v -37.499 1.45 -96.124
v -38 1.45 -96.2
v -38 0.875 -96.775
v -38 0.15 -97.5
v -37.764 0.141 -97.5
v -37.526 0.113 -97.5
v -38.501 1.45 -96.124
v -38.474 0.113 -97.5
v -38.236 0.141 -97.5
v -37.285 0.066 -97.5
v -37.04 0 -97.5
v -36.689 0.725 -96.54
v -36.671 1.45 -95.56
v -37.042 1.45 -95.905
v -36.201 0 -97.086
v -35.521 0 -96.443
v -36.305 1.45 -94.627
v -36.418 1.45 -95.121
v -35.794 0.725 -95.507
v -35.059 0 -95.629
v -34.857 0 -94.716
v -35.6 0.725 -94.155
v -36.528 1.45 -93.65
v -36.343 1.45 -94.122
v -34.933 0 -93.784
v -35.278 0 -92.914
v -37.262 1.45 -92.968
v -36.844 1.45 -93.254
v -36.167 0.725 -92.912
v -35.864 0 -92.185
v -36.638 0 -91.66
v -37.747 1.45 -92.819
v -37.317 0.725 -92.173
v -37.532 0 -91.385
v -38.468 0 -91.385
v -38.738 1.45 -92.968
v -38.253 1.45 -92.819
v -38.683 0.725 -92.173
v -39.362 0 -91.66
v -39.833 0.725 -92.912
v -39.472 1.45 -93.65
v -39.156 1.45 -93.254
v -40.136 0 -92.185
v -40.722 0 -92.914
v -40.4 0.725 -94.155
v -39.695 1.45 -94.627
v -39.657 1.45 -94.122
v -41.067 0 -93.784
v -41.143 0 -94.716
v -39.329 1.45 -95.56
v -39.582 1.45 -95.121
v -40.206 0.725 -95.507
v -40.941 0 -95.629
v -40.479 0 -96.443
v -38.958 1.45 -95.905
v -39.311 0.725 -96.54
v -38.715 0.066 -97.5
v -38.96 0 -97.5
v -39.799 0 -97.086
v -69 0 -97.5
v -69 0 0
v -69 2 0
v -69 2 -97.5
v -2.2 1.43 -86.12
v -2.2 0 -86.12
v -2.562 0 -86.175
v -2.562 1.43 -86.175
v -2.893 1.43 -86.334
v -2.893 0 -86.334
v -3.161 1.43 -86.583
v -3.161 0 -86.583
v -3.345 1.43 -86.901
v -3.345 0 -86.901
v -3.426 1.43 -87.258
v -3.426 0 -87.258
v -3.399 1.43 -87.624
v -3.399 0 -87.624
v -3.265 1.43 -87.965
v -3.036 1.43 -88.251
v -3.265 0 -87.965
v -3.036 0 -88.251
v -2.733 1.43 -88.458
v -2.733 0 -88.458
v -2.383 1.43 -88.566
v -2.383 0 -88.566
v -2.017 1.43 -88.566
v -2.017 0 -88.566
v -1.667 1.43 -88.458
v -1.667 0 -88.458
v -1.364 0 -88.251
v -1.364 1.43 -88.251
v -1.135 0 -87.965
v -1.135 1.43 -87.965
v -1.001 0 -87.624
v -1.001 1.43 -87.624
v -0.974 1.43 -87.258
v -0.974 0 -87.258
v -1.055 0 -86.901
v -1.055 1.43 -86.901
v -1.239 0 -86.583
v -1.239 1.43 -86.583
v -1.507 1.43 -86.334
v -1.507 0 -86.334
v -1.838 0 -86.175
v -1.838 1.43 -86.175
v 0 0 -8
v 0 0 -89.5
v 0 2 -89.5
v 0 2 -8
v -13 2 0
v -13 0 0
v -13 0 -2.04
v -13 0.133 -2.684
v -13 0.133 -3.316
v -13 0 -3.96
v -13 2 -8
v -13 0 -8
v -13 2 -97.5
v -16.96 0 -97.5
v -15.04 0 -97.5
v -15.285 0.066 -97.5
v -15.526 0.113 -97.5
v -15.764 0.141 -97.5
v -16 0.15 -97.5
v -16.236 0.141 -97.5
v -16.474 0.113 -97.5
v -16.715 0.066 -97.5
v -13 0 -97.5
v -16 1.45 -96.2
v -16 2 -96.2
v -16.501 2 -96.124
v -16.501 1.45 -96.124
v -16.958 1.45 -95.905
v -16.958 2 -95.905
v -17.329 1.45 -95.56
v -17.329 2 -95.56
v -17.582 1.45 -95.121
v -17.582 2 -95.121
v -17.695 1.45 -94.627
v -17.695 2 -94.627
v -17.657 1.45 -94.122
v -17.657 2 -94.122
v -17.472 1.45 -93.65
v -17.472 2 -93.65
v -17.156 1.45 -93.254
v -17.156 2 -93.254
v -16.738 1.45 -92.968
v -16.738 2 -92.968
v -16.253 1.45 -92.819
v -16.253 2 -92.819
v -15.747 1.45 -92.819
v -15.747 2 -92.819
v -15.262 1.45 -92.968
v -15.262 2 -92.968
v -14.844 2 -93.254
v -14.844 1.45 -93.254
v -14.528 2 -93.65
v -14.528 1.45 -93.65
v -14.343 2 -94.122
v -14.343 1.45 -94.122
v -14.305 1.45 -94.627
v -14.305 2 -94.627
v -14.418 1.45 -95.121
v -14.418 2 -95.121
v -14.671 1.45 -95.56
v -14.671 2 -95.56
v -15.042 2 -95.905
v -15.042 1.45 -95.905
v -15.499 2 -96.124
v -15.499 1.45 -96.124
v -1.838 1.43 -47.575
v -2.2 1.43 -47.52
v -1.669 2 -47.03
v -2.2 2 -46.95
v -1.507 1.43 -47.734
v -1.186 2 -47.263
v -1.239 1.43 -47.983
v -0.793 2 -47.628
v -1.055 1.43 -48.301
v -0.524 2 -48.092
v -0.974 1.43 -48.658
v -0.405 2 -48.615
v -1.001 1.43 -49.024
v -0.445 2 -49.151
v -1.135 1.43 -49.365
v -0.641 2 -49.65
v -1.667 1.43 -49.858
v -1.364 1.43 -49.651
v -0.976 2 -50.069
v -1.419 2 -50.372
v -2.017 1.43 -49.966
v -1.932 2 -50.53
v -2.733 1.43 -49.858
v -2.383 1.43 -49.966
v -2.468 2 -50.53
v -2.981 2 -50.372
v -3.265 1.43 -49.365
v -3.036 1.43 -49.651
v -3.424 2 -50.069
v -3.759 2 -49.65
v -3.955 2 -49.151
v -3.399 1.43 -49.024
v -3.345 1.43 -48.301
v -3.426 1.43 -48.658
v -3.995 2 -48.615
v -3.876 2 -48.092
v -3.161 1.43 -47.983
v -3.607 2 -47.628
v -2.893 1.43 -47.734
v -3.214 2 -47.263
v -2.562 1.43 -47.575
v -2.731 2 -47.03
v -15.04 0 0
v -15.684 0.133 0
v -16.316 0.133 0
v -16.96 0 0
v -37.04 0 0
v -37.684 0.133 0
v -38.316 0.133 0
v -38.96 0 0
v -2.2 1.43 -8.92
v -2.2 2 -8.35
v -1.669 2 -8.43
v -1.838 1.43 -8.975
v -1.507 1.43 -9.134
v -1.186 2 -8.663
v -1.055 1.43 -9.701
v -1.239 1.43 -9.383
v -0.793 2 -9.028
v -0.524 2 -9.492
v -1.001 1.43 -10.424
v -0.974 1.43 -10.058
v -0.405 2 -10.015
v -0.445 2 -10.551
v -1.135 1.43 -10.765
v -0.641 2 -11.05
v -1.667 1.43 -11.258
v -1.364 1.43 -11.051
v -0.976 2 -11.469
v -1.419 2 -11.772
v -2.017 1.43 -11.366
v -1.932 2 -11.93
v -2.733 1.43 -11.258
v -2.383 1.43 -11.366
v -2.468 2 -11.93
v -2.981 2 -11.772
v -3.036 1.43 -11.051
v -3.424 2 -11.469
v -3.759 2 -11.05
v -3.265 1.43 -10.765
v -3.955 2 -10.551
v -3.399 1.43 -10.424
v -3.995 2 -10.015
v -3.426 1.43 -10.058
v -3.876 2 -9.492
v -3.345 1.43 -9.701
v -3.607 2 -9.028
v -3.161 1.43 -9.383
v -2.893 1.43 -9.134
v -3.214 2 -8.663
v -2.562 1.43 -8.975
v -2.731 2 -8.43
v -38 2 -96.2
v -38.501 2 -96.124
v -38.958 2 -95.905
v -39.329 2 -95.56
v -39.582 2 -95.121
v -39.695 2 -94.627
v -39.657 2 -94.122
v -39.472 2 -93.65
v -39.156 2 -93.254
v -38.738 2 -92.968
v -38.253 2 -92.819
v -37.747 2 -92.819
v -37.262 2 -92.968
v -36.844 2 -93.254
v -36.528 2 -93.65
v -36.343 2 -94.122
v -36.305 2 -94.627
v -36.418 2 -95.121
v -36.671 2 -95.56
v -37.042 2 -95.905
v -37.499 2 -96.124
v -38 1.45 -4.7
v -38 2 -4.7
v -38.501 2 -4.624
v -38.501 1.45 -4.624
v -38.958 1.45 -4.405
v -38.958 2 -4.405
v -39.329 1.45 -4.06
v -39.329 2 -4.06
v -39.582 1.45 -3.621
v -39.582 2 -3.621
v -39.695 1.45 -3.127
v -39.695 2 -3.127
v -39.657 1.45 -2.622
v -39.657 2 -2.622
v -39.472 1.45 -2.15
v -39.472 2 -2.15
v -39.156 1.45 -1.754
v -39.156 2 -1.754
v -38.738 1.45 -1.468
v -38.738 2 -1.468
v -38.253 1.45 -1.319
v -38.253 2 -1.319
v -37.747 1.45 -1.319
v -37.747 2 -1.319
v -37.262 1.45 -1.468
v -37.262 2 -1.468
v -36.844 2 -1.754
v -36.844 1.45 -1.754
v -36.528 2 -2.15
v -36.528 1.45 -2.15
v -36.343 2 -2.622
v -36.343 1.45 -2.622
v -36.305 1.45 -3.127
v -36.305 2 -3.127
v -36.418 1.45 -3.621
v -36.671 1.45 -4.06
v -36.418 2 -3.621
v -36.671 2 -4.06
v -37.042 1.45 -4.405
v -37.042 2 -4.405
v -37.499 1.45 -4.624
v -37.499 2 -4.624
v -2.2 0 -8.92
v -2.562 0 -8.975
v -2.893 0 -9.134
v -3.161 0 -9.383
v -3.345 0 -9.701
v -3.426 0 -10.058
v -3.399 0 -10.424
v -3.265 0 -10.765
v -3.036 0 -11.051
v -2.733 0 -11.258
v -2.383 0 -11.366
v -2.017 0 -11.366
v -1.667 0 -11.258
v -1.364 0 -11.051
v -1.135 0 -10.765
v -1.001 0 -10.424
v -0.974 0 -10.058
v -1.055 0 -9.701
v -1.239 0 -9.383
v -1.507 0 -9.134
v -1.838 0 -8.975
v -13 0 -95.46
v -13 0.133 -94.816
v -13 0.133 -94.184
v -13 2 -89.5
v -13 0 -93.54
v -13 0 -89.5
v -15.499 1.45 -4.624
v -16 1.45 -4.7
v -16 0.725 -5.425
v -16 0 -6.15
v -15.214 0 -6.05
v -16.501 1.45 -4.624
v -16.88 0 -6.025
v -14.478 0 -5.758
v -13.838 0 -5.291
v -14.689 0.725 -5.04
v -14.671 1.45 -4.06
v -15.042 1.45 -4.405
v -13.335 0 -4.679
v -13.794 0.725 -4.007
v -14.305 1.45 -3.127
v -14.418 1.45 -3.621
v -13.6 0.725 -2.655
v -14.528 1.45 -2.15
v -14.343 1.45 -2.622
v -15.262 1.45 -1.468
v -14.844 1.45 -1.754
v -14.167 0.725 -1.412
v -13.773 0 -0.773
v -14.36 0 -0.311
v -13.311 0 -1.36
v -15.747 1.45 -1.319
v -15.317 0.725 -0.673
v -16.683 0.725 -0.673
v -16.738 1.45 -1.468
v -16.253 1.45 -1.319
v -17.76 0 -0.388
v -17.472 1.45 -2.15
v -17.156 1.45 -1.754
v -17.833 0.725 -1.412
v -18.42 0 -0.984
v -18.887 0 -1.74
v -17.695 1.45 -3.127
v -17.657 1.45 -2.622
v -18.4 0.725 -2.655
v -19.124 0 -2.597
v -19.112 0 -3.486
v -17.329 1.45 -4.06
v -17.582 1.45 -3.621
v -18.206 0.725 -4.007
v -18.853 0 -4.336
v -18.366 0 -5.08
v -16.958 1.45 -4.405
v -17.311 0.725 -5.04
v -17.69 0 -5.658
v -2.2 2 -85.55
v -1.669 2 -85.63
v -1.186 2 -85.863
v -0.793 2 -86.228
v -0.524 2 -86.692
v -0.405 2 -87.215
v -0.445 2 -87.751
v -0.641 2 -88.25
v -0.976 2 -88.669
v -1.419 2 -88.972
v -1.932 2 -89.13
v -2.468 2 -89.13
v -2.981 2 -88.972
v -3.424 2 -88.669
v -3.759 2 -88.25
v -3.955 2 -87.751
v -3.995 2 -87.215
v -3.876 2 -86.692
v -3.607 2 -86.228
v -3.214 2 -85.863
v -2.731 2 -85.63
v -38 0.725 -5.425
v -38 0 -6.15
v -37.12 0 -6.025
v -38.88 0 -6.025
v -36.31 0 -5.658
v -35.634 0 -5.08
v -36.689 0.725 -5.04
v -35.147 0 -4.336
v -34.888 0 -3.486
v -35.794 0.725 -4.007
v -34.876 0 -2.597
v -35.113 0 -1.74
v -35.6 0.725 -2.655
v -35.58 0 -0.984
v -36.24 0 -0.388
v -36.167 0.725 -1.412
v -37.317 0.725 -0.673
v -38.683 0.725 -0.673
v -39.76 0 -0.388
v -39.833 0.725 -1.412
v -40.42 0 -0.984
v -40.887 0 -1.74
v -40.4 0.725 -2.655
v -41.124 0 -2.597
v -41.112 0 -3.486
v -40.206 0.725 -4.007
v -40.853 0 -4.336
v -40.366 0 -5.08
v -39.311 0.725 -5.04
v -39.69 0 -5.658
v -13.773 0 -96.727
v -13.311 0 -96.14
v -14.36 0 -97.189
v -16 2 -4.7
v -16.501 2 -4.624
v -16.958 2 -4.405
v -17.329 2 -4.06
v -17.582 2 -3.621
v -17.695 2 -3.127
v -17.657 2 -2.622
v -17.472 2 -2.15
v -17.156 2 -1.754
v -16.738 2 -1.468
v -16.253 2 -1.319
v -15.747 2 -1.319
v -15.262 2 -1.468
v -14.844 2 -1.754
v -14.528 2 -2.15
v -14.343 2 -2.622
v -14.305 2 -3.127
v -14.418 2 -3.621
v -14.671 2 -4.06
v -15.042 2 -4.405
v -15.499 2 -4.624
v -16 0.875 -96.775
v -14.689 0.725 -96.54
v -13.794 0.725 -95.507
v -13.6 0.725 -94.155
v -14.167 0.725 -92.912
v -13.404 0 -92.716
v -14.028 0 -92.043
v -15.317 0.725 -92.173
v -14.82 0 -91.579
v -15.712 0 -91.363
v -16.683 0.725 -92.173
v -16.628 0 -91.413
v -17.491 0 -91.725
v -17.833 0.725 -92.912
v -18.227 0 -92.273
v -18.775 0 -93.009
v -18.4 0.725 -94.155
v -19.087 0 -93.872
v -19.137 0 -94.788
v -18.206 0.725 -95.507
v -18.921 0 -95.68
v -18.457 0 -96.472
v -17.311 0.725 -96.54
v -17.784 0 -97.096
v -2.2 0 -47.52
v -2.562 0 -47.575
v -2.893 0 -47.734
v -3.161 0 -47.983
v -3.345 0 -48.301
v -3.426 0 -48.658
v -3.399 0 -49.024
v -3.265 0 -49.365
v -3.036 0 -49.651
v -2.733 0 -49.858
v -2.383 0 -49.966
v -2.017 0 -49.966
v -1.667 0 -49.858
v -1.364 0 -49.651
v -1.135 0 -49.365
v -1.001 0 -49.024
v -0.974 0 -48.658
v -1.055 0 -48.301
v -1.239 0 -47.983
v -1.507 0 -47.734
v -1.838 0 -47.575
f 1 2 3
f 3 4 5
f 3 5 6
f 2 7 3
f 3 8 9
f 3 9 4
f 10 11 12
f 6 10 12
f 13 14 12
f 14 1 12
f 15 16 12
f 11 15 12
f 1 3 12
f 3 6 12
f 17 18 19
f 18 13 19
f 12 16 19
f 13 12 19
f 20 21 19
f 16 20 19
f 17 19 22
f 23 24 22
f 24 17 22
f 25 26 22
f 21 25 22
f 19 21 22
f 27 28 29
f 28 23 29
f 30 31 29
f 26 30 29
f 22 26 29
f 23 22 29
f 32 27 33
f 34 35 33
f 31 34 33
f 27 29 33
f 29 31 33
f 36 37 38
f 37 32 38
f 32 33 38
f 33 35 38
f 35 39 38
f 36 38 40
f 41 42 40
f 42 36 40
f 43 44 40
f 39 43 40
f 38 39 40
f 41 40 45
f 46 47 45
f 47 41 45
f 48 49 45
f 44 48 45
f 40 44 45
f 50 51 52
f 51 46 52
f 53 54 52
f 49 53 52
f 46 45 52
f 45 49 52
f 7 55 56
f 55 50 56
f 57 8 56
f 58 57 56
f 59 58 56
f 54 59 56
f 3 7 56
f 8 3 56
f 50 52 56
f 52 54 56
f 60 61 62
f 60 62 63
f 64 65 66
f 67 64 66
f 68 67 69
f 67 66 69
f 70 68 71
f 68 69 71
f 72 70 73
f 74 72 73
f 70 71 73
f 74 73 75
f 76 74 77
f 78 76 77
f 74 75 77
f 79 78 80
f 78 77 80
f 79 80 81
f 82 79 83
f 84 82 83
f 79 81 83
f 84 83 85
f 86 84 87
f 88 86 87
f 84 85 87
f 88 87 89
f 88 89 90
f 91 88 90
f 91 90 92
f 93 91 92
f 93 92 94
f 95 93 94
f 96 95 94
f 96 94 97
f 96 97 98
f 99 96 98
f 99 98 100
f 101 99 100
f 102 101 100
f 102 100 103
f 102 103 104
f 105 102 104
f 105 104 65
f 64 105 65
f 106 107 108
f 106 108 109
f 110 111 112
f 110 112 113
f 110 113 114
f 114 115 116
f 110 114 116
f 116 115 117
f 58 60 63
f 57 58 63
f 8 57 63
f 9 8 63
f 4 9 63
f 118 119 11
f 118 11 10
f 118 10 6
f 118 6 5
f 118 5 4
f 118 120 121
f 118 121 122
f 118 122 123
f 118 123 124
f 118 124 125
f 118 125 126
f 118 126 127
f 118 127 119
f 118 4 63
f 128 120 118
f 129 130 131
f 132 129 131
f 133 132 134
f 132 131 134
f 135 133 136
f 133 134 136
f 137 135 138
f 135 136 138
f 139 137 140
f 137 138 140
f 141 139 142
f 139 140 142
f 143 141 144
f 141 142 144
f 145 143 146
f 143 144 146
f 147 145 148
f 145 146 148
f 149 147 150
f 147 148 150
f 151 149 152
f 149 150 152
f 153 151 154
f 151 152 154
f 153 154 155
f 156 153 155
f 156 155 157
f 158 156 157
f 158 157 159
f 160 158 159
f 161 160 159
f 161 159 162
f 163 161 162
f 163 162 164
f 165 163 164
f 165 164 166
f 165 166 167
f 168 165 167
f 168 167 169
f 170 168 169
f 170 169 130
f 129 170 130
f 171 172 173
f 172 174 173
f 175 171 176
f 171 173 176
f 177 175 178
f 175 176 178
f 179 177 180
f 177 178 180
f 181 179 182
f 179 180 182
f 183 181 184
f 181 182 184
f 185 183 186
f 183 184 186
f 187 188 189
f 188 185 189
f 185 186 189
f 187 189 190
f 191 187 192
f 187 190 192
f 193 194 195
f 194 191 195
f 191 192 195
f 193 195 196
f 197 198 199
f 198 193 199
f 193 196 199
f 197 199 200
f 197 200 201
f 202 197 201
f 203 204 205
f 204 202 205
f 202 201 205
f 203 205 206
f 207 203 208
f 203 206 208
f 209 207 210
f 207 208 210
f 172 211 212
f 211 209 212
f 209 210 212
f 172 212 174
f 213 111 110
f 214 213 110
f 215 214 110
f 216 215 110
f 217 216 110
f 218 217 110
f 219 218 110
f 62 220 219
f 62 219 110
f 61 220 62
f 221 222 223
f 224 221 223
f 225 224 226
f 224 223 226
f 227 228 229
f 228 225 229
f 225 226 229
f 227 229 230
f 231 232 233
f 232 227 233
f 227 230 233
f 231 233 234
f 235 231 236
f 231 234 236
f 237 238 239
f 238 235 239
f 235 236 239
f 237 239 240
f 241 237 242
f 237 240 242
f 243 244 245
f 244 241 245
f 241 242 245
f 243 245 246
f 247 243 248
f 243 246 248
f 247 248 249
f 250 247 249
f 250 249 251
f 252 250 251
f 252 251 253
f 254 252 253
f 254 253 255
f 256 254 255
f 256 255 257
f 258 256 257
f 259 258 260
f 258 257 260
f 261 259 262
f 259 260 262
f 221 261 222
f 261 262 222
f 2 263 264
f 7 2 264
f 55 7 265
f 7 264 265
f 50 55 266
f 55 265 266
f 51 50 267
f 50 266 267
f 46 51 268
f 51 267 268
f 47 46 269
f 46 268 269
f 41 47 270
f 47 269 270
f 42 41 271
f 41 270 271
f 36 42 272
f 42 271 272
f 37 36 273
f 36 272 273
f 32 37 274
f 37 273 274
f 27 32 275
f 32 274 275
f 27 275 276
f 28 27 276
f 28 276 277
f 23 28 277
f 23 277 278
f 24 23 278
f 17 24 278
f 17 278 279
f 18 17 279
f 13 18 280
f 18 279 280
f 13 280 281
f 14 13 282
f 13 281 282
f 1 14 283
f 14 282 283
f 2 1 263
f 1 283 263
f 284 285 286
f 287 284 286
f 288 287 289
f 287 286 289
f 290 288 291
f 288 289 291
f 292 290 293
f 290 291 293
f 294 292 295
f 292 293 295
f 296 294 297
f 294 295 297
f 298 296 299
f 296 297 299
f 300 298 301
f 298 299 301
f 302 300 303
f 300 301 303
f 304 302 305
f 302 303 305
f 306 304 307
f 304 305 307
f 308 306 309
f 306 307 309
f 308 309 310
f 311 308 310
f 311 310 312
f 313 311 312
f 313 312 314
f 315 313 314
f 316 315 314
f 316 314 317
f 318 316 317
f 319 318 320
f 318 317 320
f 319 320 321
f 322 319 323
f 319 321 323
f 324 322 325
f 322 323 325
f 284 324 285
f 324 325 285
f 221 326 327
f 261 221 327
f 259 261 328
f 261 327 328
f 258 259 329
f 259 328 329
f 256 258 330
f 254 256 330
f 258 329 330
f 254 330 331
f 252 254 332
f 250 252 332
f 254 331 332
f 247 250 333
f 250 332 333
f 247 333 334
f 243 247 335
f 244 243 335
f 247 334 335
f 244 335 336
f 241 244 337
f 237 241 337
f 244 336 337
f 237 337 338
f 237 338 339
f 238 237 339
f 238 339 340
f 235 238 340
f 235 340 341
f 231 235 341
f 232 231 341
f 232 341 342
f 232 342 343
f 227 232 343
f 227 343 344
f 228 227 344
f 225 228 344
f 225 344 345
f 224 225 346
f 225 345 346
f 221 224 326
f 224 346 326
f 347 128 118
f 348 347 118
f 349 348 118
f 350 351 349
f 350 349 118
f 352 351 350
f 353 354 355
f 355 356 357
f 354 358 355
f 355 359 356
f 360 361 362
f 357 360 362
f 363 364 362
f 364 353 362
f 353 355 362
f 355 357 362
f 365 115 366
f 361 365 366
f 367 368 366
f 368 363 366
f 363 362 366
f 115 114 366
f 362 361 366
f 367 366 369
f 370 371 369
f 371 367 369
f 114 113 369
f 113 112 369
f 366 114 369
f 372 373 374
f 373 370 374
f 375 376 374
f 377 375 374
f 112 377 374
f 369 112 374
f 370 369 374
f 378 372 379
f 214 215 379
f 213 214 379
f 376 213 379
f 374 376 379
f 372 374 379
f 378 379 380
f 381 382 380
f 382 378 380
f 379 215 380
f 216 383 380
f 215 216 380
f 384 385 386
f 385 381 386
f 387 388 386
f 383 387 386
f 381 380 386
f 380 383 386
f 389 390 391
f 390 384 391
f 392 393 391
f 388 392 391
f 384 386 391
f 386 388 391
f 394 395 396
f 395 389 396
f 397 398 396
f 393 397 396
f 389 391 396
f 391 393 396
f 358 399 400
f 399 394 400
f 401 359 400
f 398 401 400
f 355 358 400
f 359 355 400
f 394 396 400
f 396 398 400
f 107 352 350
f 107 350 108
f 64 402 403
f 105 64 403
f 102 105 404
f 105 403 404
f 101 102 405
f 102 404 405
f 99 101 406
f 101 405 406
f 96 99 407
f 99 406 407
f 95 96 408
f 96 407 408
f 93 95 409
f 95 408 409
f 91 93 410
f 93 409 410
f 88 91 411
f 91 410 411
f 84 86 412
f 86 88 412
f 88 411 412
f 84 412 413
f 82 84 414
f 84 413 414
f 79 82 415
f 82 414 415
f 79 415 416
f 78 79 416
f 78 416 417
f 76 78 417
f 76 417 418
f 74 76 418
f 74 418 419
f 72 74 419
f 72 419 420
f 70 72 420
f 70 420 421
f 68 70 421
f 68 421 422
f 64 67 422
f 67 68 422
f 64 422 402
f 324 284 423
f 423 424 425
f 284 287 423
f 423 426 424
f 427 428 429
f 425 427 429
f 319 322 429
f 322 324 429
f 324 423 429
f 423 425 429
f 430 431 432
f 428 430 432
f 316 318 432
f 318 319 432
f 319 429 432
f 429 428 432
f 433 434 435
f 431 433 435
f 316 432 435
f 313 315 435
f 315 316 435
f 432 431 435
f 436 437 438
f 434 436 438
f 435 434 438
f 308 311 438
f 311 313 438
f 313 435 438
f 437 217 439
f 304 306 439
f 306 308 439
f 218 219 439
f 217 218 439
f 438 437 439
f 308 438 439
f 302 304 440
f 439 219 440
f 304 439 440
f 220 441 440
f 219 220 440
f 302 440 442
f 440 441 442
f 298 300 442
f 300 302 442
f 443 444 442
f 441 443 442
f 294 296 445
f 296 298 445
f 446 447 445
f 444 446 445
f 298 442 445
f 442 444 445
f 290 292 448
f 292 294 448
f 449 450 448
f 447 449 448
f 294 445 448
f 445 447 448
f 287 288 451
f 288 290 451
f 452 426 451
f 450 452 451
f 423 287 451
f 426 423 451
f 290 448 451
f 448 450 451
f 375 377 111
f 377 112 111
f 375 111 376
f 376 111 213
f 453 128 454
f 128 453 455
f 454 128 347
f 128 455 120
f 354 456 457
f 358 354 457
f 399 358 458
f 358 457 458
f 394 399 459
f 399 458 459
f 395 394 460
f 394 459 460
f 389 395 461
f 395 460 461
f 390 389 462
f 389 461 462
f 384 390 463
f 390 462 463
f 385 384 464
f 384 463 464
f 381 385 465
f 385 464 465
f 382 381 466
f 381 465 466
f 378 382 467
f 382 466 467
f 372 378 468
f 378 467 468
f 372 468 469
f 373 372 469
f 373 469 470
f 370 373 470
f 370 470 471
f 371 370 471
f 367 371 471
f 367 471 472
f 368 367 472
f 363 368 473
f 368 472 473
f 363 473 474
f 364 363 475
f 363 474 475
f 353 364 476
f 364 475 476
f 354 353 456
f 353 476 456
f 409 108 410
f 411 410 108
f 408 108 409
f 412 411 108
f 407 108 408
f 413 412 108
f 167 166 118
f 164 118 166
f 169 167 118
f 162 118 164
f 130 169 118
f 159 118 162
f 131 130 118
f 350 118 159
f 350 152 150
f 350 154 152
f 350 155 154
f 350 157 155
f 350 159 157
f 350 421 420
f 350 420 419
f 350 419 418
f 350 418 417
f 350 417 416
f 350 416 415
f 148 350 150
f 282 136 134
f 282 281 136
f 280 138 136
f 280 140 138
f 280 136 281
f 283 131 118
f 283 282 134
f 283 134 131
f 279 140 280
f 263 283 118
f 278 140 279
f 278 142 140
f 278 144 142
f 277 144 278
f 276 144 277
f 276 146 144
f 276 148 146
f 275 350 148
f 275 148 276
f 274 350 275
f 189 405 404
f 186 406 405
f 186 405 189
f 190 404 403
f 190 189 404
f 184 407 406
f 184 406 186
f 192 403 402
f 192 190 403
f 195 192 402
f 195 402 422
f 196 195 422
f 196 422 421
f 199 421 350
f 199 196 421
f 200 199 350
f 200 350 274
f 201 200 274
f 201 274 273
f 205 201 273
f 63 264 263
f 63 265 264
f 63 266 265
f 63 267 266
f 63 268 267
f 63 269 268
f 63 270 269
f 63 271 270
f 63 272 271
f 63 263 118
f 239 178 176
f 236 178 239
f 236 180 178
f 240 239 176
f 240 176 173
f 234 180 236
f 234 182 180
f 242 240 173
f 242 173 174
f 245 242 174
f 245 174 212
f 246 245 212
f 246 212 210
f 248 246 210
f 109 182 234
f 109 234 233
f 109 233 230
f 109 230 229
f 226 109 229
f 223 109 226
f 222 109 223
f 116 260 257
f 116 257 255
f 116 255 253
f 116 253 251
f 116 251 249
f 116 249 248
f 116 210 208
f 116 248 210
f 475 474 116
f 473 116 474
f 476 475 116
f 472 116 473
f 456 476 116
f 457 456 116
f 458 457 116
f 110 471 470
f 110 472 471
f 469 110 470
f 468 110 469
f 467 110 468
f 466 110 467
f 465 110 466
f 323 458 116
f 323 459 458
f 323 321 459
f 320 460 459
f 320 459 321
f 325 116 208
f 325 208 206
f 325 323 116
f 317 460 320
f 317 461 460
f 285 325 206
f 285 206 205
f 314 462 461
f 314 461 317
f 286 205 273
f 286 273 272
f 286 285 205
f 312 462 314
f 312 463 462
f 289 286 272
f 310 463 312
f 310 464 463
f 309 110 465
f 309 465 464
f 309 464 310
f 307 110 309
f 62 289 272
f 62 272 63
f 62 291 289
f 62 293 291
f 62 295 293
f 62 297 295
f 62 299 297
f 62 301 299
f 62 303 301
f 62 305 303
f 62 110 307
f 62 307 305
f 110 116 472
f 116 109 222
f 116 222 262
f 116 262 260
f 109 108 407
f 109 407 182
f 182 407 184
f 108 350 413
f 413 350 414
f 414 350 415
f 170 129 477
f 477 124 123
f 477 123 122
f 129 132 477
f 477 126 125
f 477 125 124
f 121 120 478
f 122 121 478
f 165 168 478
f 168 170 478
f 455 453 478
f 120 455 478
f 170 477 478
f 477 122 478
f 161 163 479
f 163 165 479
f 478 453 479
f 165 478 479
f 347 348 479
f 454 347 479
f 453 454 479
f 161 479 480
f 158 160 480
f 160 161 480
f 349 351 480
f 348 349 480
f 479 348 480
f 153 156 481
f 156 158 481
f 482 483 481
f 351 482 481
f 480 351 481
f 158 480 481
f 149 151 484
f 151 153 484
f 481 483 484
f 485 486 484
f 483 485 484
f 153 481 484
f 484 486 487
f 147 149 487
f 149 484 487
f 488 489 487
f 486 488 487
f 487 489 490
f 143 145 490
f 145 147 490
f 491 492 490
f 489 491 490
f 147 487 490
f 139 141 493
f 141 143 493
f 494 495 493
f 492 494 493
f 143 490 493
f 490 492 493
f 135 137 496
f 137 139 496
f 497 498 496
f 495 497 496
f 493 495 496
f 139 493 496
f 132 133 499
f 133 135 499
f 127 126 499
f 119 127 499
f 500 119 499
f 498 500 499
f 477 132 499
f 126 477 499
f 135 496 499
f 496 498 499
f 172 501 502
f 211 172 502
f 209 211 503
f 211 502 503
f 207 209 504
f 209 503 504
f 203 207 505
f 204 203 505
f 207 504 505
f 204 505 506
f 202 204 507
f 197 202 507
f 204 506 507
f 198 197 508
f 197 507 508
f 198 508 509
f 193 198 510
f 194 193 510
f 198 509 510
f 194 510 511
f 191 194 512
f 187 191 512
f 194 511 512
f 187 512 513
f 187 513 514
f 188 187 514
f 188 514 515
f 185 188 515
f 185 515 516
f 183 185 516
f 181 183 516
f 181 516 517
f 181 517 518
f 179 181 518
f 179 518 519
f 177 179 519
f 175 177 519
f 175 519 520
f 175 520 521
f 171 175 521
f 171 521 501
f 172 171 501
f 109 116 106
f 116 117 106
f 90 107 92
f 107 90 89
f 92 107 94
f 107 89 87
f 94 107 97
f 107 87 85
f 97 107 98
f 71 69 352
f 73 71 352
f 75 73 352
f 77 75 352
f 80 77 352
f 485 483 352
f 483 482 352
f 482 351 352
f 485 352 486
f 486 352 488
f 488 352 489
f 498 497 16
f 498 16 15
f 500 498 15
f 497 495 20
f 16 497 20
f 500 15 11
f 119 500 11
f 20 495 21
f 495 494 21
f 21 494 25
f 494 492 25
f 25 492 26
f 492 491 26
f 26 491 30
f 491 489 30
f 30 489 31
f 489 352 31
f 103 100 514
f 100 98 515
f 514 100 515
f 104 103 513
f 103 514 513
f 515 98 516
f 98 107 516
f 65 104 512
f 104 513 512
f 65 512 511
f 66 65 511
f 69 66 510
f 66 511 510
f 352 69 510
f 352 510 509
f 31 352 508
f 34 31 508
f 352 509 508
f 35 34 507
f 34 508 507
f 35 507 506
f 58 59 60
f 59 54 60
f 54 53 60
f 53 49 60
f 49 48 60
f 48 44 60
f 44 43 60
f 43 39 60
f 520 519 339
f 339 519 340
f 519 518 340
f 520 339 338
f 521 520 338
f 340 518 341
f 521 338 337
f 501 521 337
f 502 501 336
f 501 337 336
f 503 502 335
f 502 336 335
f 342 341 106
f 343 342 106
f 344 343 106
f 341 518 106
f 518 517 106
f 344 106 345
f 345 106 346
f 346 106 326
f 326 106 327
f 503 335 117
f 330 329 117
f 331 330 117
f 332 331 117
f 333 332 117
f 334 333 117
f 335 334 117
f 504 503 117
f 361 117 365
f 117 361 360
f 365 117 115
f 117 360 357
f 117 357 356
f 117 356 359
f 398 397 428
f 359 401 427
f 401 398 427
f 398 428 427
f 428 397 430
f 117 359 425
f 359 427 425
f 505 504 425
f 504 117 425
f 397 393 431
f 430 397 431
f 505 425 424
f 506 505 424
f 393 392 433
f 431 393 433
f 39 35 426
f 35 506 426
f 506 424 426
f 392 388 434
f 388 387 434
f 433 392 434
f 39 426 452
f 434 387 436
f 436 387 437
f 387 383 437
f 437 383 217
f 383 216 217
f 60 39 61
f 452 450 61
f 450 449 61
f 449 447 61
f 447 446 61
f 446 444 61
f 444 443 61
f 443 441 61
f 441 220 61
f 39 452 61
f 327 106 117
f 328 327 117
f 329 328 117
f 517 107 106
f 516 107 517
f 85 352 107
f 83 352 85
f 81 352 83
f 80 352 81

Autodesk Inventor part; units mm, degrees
ref_plane "YZ Plane" through (0, 0, 0) normal (1, 0, 0) x (0, 1, 0)
ref_plane "XZ Plane" through (0, 0, 0) normal (0, 1, 0) x (-1, 0, 0)
ref_plane "XY Plane" through (0, 0, 0) normal (0, 0, 1) x (1, 0, 0)
sketch "Sketch1" plane through (0, 0, 0) normal (0, 1, 0) x (-1, 0, 0)
  line L0 (0, 0) -> (92.5, 0)
  line L1 (92.5, -97.5) -> (0, -97.5)
  line L2 (0, -97.5) -> (0, 0)
  line L3 (92.5, 0) -> (69, 0)
  line L4 (69, 0) -> (69, -97.5)
  line L5 (92.5, -97.5) -> (69, -97.5)
  line L6 (0, -97.5) -> (13, -97.5)
  line L7 (13, -97.5) -> (13, -89.5)
  line L8 (13, -89.5) -> (0, -89.5)
  line L9 (0, -89.5) -> (0, -97.5)
  line L10 (0, 0) -> (13, 0)
  line L11 (13, 0) -> (13, -8)
  line L12 (13, -8) -> (0, -8)
  line L13 (0, -8) -> (0, 0)
  point P0 (69, -97.5)
  dimension "d0" = 92.5
  dimension "d1" = 97.5
  dimension "d4" = 13
  dimension "d5" = 8
  dimension "d24" = 69
extrude "Extrusion1" add sketch "Sketch1" along normal blind 2 contours L0 L4 L1 L7 L8 L2 L12 L11
sketch "Sketch2" plane through (0, 2, 0) normal (0, 1, 0) x (1, 0, 0)
  circle A0 centre (-2.2, 10.15) radius 1.6421 projected
  circle A1 centre (-2.2, 48.75) radius 1.6421 projected
  circle A2 centre (-2.2, 87.35) radius 1.6421 projected
  point P0 (0, 0)
hole "Hole1" at (-2.2, 2, -10.15) at (-2.2, 2, -48.75) at (-2.2, 2, -87.35) direction (0, -1, 0) diameter 2.459 end through all countersink diameter 3.6 countersink angle 90 thread size "M3x0.5" class "6H" standard "ISO Metric profile"
sketch "Sketch3" plane through (0, 0, 0) normal (0, -1, 0) x (1, 0, 0)
  line L0 (-13, -97.5) -> (-69, -97.5) construction
  line L1 (-13, -89.5) -> (-13, -97.5) construction
  line L2 (0, -8) -> (0, -89.5) construction
  line L3 (0, -48.75) -> (-69, -48.75) construction
  line L4 (-69, -97.5) -> (-69, 0) construction
  point P0 (-13, 0)
  point P1 (-16, -94.5)
  point P2 (-38, -94.5)
  point P3 (-16, -3)
  point P4 (-38, -3)
  dimension "d25" = 3
  dimension "d26" = 3
  dimension "d27" = 22
hole "Hole2" at (-16, 0, -94.5) at (-38, 0, -94.5) at (-16, 0, -3) at (-38, 0, -3) direction (0, 1, 0) diameter 3.4 end through all countersink diameter 6.3 countersink angle 90 clearance for "Countersunk Flat Head Screw ISO 2009/7046" size "M3" standard "ISO"
properties part number "Blacha" material "Steel"
